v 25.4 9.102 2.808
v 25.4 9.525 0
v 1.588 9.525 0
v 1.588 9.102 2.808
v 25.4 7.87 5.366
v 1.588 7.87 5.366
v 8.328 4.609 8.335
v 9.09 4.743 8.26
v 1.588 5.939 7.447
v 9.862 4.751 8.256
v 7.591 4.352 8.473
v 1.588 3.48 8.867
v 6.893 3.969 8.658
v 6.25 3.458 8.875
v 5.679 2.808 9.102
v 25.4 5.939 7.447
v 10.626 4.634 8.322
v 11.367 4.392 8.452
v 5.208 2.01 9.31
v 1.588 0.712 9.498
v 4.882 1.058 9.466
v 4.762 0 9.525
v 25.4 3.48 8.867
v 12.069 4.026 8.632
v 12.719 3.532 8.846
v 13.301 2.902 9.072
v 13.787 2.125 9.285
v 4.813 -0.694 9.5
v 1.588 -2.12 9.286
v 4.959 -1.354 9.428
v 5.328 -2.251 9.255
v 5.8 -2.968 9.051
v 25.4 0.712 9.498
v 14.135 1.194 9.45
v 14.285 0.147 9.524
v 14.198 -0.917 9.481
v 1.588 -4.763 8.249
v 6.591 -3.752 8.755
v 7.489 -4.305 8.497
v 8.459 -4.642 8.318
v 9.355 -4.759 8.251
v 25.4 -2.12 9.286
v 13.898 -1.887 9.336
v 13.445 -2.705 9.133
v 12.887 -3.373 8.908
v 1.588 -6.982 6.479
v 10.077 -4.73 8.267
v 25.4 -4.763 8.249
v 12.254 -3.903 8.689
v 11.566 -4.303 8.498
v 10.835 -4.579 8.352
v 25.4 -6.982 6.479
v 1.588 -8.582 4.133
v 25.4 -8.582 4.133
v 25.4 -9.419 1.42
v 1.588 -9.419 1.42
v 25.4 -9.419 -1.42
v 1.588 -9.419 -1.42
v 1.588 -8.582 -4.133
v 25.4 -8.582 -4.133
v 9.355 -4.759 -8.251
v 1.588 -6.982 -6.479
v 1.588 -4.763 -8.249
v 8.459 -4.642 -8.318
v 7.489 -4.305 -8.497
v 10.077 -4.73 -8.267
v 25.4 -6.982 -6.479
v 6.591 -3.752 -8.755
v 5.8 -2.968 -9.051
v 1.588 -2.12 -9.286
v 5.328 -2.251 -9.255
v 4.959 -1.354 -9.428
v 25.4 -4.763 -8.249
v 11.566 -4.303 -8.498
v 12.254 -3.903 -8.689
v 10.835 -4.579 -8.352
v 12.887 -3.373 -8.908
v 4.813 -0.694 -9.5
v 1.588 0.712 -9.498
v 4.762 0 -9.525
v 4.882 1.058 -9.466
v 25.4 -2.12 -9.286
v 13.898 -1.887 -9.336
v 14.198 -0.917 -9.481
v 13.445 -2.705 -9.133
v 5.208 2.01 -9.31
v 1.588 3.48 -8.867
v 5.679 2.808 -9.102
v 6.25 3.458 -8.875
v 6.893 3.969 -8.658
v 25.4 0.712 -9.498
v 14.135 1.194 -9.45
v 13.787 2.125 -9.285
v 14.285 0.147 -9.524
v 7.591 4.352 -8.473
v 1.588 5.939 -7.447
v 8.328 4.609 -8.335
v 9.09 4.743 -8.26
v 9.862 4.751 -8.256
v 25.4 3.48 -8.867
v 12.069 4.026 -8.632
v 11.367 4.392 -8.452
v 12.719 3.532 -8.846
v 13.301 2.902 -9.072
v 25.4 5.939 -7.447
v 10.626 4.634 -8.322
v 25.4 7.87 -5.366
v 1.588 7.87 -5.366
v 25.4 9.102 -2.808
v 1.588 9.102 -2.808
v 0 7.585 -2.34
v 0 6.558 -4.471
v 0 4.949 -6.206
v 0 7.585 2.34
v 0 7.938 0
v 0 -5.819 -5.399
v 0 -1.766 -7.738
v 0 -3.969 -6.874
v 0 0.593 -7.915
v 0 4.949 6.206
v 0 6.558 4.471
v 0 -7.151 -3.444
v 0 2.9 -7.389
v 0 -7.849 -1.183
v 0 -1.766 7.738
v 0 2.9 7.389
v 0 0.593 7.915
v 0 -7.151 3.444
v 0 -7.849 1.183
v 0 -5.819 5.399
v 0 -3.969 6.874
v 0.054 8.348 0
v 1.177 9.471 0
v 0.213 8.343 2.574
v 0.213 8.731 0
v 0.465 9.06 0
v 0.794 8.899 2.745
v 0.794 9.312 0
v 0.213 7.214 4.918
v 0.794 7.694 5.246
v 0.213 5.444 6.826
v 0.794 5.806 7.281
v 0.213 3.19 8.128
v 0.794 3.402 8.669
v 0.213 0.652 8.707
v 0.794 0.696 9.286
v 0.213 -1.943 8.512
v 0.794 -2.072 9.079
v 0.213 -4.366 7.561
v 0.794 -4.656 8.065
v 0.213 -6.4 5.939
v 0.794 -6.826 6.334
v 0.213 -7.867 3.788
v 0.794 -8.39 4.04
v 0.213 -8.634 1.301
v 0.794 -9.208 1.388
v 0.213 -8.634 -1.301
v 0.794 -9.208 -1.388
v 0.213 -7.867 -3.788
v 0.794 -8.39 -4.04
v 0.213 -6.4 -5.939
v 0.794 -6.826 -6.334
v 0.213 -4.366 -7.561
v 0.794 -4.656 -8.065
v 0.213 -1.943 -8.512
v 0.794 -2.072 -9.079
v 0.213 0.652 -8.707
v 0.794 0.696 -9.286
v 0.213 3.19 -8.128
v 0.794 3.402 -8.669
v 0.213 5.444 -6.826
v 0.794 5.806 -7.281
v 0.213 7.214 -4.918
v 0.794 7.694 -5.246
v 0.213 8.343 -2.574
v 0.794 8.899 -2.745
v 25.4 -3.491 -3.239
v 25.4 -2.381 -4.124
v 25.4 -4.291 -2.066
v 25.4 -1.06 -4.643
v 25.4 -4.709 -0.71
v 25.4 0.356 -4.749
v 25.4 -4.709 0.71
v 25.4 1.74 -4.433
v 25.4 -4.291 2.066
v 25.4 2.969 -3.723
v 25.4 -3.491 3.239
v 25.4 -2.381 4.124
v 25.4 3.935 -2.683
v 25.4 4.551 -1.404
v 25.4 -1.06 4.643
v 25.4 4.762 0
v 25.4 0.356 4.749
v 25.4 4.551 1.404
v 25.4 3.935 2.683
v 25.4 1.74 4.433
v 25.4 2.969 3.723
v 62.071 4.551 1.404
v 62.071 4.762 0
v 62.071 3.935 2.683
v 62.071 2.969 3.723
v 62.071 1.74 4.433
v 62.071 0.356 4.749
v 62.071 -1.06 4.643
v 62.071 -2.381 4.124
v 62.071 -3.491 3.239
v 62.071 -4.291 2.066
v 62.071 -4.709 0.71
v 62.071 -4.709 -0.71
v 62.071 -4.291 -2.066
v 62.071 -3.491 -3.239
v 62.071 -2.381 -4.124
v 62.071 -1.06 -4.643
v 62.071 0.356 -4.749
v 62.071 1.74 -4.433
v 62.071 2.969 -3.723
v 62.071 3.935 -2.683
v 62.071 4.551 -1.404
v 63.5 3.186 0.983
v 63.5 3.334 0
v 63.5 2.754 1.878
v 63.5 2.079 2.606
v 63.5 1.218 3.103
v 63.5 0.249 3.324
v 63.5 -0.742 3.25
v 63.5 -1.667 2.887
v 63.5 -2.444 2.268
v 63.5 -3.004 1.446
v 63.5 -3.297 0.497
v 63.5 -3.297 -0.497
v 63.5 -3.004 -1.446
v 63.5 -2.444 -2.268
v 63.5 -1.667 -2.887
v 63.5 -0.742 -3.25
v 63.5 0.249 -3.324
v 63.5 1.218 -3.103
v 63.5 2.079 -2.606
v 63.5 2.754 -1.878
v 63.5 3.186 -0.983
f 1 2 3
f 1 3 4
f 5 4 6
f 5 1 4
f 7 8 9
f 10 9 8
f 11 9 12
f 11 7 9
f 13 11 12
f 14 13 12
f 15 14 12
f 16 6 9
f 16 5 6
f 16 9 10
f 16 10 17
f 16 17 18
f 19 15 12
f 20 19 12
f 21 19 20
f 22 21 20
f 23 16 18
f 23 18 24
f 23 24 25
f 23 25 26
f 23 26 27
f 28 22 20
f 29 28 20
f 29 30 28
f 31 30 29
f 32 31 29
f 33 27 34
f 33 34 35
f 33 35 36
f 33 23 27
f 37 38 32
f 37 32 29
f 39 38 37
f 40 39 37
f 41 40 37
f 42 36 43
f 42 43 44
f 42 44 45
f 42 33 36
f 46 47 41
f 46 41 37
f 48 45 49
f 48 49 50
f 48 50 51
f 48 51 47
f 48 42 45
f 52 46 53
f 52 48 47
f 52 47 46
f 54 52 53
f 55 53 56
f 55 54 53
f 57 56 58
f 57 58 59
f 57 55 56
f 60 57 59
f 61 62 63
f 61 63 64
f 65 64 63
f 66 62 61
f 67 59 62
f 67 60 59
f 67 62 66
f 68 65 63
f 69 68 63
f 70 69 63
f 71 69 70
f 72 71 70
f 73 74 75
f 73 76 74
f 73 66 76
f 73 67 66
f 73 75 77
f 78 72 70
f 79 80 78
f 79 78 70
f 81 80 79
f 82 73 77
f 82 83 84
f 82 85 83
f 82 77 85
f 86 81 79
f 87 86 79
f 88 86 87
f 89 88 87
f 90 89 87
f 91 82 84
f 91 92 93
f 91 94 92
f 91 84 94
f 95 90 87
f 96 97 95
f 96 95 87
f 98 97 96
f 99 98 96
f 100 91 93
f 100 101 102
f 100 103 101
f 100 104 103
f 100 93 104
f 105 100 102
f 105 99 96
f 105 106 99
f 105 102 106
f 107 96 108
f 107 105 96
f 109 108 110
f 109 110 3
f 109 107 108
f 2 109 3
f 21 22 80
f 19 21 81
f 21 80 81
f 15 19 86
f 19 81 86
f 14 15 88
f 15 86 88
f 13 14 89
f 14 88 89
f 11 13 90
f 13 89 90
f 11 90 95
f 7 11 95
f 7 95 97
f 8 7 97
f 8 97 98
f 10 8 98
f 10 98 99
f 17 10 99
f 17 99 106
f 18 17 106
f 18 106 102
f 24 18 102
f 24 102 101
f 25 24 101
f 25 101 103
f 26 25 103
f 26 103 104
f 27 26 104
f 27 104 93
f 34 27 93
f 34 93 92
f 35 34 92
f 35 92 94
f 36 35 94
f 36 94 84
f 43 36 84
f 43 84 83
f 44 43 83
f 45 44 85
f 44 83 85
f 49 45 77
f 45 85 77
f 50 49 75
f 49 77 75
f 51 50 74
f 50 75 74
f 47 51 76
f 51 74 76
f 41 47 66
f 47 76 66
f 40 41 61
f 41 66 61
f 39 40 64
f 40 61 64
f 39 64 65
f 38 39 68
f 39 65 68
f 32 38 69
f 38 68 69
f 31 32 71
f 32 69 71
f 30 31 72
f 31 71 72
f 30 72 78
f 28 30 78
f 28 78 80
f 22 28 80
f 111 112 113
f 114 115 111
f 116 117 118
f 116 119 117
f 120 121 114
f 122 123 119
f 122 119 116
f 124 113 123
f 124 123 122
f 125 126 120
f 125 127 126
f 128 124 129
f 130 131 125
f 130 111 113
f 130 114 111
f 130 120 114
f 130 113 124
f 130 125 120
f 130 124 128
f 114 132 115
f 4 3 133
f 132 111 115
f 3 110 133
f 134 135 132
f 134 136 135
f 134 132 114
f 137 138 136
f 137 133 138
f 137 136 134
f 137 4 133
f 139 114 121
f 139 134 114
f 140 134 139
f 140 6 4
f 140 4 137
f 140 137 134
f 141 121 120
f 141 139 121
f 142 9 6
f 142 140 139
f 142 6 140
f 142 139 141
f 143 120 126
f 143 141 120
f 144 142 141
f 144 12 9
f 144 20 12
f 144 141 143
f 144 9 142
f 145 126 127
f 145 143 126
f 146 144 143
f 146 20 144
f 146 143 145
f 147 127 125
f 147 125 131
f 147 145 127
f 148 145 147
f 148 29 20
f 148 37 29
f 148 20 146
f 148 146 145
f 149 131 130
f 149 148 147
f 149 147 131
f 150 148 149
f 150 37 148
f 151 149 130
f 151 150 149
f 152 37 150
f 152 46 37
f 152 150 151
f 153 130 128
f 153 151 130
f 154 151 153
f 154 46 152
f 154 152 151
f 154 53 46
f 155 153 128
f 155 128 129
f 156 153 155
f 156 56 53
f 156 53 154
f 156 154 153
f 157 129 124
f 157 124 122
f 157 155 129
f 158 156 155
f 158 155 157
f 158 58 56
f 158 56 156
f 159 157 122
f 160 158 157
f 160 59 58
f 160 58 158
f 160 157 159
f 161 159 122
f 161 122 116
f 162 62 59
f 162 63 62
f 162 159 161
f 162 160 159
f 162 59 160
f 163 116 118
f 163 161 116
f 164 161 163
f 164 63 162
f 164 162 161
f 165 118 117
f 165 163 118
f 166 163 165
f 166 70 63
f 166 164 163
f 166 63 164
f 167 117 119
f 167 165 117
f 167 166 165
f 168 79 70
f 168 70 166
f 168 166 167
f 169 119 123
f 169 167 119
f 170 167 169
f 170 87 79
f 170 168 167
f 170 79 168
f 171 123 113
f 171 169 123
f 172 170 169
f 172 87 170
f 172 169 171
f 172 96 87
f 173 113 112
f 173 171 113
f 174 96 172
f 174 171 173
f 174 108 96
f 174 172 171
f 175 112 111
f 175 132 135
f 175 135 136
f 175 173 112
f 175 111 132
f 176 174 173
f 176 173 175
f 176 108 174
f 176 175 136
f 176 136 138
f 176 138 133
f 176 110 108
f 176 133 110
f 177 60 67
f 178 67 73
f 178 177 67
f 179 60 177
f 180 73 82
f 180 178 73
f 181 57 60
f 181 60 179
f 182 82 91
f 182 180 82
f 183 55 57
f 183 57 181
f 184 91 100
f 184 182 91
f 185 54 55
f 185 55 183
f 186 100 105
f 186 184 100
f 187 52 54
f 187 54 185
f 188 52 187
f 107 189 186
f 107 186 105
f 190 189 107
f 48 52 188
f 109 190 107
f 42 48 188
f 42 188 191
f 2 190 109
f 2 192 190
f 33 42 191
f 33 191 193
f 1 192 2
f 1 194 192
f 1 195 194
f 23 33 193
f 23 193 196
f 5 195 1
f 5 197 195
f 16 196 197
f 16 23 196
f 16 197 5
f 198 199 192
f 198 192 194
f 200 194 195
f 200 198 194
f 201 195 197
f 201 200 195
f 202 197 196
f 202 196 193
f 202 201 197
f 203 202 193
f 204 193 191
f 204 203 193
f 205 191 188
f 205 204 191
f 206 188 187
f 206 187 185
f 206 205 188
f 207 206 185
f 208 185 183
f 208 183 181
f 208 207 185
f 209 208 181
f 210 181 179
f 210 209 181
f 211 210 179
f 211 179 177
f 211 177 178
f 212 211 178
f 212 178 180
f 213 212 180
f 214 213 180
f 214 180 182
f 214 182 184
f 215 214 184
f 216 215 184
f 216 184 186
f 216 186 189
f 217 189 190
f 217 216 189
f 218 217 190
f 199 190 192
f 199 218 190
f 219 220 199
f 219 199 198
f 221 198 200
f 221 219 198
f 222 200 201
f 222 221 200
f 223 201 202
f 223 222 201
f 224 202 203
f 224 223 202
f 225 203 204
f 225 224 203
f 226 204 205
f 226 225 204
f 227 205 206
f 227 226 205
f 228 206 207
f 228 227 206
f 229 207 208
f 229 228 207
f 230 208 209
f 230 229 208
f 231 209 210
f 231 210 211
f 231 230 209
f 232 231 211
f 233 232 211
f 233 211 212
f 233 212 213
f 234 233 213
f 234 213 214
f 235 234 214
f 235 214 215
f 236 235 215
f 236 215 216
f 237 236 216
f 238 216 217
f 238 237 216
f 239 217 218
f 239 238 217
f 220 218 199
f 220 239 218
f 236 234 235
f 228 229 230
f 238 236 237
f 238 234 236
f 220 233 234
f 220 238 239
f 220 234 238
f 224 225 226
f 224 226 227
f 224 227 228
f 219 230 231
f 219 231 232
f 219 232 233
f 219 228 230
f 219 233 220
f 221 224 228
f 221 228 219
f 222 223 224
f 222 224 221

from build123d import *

# Parameters (mm, degrees)
F_3_8_0_3750_DOWEL_HOLE1_D = 9.525
FILLET2_R                  = 1.5875
CHAMFER3_SIZE              = 1.42875


with BuildPart() as part:
    # Sketch1 → Revolve1 (revolve)
    with BuildSketch(Plane.XY):
        Polygon((0, 0), (0, 9.525), (25.4, 9.525), (25.4, 4.7625), (63.5, 4.7625), (63.5, 0), align=None)
    revolve(axis=Axis((0, 0, 0), (1, 0, 0)))

    # 3/8 (0.3750) Dowel Hole1 (through all)
    with Locations(Plane.XY.offset(9.525)):
        with Locations((9.525, 0)):
            Hole(F_3_8_0_3750_DOWEL_HOLE1_D / 2)

    # Fillet2
    fillet2_edges = [part.edges().sort_by_distance(p)[0] for p in [
        (0, -9.525, 0),
    ]]
    fillet(fillet2_edges, radius=FILLET2_R)

    # Chamfer3
    chamfer3_edges = [part.edges().sort_by_distance(p)[0] for p in [
        (63.5, -4.7625, 0),
    ]]
    chamfer(chamfer3_edges, length=CHAMFER3_SIZE)


solid = part.part
